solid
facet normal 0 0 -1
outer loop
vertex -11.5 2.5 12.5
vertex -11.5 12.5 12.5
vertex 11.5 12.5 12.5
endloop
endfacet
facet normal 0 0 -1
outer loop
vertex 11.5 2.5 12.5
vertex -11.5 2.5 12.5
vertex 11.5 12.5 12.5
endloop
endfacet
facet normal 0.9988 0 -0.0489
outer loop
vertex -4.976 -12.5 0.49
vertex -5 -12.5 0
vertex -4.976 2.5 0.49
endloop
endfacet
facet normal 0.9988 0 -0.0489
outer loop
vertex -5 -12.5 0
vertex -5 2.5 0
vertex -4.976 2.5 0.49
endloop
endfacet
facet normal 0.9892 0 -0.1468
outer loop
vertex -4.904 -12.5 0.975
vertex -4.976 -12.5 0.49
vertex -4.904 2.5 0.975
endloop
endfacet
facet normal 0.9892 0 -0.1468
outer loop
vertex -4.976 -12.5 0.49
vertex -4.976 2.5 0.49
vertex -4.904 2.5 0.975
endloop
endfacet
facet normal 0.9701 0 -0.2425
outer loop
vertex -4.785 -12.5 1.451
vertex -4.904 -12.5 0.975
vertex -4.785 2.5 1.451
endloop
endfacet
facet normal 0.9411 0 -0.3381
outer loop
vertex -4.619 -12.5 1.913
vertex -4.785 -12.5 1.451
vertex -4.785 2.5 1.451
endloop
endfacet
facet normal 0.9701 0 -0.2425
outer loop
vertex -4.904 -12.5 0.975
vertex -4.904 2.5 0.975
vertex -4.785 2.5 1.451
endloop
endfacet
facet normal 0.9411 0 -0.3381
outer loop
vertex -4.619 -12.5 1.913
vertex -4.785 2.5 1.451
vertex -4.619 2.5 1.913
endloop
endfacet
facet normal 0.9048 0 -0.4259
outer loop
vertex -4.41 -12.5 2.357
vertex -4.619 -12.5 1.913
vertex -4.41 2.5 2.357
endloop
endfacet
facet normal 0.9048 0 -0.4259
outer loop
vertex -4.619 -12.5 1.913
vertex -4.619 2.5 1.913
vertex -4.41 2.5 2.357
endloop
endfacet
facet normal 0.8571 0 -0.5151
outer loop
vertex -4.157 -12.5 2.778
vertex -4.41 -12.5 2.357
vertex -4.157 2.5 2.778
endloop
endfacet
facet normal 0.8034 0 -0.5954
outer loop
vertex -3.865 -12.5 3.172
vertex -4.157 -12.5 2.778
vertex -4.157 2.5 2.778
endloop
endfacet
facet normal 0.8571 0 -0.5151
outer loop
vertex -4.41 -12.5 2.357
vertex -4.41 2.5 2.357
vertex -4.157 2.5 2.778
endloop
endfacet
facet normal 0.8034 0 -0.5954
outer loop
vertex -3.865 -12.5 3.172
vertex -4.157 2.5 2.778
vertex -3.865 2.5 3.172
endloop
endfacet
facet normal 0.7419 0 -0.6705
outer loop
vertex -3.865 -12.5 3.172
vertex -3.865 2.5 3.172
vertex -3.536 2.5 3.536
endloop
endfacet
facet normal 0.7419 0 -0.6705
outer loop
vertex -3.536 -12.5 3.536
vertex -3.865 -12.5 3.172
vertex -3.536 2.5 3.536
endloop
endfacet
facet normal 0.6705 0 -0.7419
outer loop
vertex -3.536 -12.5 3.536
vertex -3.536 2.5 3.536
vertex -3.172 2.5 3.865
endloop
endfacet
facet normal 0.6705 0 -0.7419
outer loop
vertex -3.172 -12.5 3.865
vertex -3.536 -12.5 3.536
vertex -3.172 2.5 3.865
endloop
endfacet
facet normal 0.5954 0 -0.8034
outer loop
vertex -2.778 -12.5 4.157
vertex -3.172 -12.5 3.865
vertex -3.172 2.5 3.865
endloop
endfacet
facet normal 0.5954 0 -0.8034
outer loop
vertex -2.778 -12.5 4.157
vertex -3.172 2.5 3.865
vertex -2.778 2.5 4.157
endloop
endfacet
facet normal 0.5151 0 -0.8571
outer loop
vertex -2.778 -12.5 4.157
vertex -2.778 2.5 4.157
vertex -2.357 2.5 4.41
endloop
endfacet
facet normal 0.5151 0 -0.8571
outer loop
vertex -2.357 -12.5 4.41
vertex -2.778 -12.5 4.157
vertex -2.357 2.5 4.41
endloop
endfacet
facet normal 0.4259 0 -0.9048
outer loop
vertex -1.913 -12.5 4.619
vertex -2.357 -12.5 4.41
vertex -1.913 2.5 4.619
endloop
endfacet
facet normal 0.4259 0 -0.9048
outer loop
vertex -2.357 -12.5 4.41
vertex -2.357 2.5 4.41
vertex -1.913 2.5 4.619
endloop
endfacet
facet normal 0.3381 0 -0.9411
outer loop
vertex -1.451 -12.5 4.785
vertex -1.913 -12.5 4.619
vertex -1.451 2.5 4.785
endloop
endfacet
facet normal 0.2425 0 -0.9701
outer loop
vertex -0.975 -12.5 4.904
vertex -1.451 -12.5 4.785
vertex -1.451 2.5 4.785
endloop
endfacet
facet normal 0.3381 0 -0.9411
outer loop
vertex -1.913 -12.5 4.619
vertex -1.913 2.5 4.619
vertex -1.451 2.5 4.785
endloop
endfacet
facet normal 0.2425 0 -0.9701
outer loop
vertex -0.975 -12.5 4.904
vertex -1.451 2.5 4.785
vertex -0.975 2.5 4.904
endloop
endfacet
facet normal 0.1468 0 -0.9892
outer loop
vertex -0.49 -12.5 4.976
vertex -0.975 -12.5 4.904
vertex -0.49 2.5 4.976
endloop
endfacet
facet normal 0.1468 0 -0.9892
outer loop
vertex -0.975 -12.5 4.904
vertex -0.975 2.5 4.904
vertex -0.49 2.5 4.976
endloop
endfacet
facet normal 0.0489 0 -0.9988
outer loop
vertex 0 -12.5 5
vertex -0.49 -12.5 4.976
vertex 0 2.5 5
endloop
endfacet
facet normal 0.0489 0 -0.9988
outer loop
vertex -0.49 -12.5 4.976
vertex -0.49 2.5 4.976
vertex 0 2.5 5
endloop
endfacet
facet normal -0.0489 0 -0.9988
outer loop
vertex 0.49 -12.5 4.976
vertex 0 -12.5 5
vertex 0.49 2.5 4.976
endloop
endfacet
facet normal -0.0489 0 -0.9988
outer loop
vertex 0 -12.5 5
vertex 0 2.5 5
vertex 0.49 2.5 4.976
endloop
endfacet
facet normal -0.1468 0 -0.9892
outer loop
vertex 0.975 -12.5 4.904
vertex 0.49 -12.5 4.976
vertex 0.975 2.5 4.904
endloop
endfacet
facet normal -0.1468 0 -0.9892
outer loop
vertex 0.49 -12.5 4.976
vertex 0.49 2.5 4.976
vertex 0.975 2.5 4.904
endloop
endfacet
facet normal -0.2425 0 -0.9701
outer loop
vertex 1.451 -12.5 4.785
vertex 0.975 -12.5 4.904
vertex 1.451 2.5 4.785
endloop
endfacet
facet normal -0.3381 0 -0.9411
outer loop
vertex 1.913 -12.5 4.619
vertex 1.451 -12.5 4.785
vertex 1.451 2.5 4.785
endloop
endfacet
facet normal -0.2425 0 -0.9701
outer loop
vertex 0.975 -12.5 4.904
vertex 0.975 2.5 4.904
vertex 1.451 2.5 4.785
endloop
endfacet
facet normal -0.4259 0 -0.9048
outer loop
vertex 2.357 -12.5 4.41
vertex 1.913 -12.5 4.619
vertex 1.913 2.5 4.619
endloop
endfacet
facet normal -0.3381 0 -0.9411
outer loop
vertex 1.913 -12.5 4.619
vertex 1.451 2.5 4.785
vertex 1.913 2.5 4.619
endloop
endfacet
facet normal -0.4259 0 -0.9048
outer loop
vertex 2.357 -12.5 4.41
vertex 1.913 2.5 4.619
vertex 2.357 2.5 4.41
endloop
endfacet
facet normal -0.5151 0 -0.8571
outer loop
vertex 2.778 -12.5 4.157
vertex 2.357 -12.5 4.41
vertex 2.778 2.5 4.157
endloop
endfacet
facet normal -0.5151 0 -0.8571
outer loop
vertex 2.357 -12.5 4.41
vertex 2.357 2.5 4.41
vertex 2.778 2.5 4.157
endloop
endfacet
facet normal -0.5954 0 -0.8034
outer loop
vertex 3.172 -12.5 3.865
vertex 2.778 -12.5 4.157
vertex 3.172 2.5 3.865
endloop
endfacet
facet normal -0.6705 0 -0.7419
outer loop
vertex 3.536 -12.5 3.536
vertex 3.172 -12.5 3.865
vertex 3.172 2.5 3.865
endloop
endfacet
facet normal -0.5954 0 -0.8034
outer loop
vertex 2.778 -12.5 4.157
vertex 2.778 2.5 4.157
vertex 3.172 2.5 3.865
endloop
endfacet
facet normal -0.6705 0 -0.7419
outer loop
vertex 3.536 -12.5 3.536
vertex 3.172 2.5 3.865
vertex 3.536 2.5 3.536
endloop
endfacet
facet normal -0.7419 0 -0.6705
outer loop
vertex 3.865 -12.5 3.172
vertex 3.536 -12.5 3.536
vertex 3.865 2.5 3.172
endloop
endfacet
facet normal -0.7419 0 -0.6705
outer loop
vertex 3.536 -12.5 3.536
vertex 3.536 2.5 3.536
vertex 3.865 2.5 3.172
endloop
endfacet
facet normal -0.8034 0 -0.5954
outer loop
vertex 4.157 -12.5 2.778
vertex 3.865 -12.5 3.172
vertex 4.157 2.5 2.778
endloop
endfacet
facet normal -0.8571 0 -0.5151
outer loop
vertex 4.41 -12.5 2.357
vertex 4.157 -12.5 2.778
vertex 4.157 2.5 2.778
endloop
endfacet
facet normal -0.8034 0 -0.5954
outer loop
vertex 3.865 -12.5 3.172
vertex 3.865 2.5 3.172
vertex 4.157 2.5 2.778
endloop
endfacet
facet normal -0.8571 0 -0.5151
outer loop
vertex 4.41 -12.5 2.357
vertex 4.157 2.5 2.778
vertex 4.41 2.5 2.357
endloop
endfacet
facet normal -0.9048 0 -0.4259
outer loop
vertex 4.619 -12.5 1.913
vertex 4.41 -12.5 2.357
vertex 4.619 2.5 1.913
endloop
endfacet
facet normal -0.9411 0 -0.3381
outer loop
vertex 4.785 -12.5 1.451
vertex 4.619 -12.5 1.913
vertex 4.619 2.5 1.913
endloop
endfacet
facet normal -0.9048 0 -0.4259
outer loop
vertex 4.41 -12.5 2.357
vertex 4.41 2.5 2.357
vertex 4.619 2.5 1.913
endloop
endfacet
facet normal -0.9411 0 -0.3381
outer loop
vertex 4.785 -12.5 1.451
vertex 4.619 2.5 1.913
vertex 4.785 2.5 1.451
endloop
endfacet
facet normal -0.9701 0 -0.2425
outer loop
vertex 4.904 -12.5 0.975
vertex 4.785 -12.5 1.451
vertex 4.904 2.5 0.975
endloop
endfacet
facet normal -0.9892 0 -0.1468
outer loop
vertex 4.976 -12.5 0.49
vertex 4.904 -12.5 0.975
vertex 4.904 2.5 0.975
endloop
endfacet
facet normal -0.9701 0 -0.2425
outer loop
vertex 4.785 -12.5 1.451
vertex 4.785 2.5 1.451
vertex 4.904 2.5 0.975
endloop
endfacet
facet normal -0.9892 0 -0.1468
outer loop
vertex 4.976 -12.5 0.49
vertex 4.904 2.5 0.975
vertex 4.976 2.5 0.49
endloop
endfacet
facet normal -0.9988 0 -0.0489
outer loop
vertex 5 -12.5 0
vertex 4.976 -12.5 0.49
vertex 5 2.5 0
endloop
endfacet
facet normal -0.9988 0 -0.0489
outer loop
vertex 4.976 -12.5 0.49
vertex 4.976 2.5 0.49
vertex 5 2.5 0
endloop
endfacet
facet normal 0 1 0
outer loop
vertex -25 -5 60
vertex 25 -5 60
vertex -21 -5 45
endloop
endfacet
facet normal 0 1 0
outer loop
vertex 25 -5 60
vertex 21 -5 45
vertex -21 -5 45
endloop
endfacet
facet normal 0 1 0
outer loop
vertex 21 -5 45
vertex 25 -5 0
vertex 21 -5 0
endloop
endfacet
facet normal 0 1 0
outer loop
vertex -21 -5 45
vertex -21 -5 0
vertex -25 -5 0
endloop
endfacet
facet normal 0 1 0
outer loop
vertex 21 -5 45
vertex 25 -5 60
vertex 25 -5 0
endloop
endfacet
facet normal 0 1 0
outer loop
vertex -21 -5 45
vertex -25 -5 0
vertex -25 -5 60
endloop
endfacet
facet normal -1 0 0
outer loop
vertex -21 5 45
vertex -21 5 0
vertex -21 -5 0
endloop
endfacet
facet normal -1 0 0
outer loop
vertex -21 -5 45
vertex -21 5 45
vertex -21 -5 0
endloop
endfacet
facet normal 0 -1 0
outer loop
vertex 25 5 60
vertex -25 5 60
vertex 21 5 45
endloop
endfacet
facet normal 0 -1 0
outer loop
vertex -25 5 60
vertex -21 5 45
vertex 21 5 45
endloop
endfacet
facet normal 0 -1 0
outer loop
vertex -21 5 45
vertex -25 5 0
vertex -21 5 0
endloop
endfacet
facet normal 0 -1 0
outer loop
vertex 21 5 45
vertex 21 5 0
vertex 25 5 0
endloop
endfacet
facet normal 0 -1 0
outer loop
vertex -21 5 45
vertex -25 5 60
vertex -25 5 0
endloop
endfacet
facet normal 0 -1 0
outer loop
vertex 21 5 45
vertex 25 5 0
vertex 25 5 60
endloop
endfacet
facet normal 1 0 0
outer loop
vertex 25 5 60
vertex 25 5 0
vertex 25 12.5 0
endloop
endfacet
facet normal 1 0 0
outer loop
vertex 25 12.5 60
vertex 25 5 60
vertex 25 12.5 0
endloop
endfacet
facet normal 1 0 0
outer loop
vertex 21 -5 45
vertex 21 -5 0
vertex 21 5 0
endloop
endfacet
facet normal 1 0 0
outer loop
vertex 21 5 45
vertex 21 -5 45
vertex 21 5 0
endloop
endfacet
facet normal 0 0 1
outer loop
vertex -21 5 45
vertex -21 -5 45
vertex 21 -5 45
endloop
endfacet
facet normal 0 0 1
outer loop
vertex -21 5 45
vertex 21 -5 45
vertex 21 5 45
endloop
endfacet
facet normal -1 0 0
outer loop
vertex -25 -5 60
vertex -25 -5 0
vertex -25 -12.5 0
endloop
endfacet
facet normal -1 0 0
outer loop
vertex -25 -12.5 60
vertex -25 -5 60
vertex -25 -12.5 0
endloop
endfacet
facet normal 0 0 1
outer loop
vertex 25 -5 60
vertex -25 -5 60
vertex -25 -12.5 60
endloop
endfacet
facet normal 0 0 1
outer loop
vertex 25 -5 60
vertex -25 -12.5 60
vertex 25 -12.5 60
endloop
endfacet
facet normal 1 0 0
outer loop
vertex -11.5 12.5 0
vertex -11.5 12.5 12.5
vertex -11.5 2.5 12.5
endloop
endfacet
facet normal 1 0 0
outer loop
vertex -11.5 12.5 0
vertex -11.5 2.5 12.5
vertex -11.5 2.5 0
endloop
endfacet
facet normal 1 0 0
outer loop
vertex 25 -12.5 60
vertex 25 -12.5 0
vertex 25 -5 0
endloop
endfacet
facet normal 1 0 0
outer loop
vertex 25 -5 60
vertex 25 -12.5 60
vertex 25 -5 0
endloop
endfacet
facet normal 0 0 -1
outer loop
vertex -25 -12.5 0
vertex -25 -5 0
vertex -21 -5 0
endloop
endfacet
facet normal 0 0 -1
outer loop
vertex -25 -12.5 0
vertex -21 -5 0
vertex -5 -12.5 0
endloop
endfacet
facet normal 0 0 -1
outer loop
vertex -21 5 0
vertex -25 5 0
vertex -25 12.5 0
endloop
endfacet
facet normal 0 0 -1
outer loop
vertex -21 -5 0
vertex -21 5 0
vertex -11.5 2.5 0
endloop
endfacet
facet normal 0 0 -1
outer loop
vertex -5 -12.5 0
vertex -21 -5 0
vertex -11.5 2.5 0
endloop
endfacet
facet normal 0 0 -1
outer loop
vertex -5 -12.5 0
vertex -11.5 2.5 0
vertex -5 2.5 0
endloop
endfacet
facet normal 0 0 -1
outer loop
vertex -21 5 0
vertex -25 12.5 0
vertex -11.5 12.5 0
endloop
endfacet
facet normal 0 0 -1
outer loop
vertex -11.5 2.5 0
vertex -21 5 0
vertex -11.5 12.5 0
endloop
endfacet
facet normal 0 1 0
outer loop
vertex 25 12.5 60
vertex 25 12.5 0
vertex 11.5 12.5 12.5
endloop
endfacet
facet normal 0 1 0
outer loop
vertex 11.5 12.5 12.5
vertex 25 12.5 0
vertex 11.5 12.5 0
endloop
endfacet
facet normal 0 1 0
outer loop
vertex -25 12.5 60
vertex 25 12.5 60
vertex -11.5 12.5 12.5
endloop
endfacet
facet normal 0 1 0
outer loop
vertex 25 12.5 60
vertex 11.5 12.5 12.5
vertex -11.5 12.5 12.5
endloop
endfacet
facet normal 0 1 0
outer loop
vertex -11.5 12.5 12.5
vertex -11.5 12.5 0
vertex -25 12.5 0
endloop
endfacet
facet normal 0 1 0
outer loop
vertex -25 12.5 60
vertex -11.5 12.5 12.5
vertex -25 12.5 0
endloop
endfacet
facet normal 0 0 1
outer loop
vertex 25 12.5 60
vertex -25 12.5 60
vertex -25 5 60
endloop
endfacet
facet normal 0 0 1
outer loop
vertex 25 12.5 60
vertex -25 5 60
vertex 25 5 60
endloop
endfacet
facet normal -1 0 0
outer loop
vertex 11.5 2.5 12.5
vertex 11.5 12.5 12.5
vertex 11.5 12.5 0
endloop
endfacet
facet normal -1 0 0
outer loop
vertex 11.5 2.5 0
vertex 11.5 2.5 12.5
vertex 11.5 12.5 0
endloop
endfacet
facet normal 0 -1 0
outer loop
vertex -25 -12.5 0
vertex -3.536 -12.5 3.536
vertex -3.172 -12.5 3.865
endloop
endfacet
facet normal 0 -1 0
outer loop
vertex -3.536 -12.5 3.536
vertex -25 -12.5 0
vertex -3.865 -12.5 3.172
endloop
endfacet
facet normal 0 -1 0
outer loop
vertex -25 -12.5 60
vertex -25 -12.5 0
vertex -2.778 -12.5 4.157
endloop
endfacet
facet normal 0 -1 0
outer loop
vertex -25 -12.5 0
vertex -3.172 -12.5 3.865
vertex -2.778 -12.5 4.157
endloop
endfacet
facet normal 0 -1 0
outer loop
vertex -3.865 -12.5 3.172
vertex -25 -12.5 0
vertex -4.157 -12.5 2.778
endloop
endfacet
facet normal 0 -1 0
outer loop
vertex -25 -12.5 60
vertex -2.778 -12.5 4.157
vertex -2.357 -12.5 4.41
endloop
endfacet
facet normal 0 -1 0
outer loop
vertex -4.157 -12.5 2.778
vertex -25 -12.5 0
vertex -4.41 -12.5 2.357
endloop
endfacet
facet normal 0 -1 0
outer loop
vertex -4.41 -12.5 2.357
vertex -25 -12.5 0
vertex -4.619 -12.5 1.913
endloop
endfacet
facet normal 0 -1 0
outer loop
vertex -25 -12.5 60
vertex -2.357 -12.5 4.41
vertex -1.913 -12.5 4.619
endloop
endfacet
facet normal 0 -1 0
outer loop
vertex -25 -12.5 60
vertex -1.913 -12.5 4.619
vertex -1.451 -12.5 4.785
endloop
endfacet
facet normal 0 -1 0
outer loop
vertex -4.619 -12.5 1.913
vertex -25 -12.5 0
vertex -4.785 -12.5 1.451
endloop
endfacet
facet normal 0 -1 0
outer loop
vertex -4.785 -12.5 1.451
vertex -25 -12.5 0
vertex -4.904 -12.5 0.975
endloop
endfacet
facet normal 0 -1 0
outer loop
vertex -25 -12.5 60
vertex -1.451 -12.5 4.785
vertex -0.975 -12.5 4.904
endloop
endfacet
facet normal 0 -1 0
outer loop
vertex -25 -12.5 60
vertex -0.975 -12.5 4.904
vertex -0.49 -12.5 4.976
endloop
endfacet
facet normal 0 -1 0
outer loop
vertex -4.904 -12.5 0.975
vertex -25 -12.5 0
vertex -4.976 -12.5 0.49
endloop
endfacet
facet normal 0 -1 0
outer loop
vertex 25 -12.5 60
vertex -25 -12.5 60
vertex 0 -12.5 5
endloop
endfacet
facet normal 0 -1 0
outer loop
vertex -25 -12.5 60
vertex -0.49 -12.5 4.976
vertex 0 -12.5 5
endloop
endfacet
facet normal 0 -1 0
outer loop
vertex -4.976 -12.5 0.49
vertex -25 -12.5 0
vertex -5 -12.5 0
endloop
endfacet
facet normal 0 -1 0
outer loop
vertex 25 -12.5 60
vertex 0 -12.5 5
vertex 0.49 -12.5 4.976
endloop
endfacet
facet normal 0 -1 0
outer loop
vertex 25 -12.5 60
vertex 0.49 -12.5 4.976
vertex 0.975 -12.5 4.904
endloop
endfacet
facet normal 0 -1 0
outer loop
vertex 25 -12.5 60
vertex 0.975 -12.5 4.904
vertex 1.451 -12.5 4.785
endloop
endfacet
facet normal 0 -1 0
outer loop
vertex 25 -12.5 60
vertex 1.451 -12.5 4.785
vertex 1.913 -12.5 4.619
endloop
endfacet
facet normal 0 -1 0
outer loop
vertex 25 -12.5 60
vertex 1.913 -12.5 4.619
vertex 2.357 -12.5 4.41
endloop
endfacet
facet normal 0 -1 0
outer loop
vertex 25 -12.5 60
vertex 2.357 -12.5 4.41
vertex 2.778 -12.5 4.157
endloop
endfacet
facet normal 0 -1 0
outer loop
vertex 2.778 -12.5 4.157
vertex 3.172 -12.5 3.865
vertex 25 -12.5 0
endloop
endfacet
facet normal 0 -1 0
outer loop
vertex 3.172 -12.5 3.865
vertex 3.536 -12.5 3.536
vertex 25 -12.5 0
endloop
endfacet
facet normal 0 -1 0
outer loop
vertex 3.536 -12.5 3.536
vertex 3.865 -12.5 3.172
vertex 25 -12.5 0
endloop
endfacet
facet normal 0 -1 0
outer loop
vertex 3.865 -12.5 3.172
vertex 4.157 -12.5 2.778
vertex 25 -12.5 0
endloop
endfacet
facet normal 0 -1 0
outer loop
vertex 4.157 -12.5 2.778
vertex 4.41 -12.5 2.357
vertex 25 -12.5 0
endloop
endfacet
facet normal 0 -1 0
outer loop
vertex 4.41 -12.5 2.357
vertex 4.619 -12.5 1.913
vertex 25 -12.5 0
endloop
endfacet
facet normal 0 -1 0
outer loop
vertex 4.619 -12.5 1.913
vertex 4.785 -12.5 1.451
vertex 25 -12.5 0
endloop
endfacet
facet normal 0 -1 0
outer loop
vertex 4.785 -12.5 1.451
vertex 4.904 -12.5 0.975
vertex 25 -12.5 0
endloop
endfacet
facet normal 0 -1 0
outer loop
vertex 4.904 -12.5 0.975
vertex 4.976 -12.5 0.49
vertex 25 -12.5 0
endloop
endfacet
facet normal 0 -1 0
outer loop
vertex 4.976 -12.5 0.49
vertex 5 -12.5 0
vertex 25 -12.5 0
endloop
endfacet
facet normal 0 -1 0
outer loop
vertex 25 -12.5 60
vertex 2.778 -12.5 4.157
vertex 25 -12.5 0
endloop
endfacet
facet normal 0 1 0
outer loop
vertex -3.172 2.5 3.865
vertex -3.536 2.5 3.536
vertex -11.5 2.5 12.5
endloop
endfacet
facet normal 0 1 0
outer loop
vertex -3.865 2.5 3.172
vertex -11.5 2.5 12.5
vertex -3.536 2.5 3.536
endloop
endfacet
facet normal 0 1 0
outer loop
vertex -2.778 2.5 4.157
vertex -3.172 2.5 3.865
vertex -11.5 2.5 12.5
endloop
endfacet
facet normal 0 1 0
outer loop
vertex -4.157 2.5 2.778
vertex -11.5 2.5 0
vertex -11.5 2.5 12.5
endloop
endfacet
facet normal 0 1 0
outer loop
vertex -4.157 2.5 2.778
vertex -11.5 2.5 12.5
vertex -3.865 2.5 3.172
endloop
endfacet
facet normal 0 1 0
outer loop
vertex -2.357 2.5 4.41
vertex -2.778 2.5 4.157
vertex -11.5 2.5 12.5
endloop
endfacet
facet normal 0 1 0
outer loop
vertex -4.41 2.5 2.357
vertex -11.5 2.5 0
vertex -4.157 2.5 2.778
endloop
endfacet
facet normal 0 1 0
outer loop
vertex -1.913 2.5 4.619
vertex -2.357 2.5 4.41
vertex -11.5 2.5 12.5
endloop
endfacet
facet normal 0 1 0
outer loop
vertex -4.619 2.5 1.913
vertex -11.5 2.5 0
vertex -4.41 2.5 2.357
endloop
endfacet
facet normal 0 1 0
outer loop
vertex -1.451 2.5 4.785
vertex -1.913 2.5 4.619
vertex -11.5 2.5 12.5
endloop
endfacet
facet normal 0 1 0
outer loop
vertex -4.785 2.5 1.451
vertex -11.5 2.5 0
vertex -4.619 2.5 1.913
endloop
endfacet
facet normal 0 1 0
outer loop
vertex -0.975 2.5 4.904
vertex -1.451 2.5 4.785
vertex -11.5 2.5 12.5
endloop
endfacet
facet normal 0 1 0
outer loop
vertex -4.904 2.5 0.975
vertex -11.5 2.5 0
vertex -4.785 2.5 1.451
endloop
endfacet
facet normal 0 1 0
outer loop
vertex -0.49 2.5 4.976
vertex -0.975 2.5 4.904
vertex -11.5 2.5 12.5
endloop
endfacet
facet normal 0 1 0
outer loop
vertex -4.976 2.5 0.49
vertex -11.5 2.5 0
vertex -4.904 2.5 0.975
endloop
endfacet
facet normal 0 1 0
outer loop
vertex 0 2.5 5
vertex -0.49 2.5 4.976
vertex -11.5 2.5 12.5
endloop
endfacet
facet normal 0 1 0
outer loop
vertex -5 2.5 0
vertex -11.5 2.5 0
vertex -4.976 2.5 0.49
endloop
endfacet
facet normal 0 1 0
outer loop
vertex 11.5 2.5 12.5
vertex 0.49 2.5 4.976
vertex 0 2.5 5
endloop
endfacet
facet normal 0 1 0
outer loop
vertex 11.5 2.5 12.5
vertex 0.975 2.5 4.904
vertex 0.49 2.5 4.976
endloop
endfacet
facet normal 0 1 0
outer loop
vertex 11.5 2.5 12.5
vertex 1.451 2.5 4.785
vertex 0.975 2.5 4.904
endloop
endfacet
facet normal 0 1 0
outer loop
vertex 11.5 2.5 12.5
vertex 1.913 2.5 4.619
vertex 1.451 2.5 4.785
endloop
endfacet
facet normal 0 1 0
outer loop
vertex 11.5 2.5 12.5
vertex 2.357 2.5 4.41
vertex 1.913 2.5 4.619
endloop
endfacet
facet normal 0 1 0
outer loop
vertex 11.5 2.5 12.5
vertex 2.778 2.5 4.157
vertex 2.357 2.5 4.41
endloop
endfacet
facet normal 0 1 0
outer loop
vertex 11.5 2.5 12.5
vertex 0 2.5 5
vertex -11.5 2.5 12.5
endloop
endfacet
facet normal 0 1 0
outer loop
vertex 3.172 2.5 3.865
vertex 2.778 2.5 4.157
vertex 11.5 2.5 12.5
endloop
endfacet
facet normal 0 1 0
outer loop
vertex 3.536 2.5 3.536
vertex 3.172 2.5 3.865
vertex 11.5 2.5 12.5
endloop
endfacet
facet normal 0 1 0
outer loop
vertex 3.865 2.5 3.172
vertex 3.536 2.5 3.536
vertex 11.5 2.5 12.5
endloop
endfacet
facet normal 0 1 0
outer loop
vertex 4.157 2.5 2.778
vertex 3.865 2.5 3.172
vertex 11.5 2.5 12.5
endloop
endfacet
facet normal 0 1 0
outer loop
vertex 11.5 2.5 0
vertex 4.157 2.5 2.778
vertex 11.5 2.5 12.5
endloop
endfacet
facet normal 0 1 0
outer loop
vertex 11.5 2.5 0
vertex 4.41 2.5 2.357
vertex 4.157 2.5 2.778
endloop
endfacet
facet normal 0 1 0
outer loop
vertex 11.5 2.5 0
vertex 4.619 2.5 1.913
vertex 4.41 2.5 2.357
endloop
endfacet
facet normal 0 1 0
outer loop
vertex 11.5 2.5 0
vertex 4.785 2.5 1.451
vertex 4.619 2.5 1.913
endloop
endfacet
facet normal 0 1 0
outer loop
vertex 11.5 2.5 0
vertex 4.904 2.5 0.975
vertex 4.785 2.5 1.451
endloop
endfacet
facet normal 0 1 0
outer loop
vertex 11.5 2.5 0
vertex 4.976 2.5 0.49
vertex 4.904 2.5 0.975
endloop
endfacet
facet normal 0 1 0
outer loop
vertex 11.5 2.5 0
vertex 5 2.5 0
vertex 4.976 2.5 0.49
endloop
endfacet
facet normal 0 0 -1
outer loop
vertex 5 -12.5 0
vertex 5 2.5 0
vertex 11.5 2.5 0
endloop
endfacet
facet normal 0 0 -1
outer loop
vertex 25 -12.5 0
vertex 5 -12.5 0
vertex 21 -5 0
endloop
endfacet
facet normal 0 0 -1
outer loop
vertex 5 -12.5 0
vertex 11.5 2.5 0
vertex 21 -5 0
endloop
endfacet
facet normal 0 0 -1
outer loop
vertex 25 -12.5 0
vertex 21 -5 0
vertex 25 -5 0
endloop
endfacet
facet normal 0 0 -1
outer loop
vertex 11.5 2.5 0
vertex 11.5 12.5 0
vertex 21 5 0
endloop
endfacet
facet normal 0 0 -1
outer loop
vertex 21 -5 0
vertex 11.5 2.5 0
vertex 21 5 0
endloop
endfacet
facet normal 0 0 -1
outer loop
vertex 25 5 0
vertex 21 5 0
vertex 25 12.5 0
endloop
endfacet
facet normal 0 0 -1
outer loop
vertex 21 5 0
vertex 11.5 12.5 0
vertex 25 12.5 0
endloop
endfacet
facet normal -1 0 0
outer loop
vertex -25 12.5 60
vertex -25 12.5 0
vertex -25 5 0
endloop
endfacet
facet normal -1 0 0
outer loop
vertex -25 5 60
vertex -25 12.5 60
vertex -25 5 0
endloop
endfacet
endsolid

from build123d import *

# Parameters (mm, degrees)
EXTRUDE_1_DEPTH     = 60
SKETCH_2_W          = 15
SKETCH_2_H          = 10
CUT_EXTRUDE_1_DEPTH = 77.630607462
SKETCH_4_R          = 5
CUT_EXTRUDE_2_DEPTH = 70.641941386
SKETCH_5_W          = 23
SKETCH_5_H          = 25
CUT_EXTRUDE_3_DEPTH = 10


with BuildPart() as part:
    # Эскиз1 → Бобышка-Вытянуть1 (new body)
    with BuildSketch(Plane.XY):
        Polygon((-25, -5), (-25, -12.5), (25, -12.5), (25, -5), (21, -5), (21, 5), (25, 5), (25, 12.5), (-25, 12.5), (-25, 5), (-21, 5), (-21, -5), align=None)
    extrude(amount=EXTRUDE_1_DEPTH)

    # Эскиз2 → Вырез-Вытянуть1 (cut, through all)
    with BuildSketch(Plane.ZY.offset(21)):
        with Locations((52.5, 0)):
            Rectangle(SKETCH_2_W, SKETCH_2_H)
    extrude(amount=-CUT_EXTRUDE_1_DEPTH, mode=Mode.SUBTRACT)

    # Эскиз4 → Вырез-Вытянуть2 (cut, through all)
    with BuildSketch(Plane(origin=(0, 12.5, 0), x_dir=(1, 0, 0), z_dir=(0, 1, 0))):
        Circle(SKETCH_4_R)
    extrude(amount=-CUT_EXTRUDE_2_DEPTH, mode=Mode.SUBTRACT)

    # Эскиз5 → Вырез-Вытянуть3 (cut)
    with BuildSketch(Plane(origin=(0, 12.5, 0), x_dir=(1, 0, 0), z_dir=(0, 1, 0))):
        Rectangle(SKETCH_5_W, SKETCH_5_H)
    extrude(amount=-CUT_EXTRUDE_3_DEPTH, mode=Mode.SUBTRACT)


solid = part.part
